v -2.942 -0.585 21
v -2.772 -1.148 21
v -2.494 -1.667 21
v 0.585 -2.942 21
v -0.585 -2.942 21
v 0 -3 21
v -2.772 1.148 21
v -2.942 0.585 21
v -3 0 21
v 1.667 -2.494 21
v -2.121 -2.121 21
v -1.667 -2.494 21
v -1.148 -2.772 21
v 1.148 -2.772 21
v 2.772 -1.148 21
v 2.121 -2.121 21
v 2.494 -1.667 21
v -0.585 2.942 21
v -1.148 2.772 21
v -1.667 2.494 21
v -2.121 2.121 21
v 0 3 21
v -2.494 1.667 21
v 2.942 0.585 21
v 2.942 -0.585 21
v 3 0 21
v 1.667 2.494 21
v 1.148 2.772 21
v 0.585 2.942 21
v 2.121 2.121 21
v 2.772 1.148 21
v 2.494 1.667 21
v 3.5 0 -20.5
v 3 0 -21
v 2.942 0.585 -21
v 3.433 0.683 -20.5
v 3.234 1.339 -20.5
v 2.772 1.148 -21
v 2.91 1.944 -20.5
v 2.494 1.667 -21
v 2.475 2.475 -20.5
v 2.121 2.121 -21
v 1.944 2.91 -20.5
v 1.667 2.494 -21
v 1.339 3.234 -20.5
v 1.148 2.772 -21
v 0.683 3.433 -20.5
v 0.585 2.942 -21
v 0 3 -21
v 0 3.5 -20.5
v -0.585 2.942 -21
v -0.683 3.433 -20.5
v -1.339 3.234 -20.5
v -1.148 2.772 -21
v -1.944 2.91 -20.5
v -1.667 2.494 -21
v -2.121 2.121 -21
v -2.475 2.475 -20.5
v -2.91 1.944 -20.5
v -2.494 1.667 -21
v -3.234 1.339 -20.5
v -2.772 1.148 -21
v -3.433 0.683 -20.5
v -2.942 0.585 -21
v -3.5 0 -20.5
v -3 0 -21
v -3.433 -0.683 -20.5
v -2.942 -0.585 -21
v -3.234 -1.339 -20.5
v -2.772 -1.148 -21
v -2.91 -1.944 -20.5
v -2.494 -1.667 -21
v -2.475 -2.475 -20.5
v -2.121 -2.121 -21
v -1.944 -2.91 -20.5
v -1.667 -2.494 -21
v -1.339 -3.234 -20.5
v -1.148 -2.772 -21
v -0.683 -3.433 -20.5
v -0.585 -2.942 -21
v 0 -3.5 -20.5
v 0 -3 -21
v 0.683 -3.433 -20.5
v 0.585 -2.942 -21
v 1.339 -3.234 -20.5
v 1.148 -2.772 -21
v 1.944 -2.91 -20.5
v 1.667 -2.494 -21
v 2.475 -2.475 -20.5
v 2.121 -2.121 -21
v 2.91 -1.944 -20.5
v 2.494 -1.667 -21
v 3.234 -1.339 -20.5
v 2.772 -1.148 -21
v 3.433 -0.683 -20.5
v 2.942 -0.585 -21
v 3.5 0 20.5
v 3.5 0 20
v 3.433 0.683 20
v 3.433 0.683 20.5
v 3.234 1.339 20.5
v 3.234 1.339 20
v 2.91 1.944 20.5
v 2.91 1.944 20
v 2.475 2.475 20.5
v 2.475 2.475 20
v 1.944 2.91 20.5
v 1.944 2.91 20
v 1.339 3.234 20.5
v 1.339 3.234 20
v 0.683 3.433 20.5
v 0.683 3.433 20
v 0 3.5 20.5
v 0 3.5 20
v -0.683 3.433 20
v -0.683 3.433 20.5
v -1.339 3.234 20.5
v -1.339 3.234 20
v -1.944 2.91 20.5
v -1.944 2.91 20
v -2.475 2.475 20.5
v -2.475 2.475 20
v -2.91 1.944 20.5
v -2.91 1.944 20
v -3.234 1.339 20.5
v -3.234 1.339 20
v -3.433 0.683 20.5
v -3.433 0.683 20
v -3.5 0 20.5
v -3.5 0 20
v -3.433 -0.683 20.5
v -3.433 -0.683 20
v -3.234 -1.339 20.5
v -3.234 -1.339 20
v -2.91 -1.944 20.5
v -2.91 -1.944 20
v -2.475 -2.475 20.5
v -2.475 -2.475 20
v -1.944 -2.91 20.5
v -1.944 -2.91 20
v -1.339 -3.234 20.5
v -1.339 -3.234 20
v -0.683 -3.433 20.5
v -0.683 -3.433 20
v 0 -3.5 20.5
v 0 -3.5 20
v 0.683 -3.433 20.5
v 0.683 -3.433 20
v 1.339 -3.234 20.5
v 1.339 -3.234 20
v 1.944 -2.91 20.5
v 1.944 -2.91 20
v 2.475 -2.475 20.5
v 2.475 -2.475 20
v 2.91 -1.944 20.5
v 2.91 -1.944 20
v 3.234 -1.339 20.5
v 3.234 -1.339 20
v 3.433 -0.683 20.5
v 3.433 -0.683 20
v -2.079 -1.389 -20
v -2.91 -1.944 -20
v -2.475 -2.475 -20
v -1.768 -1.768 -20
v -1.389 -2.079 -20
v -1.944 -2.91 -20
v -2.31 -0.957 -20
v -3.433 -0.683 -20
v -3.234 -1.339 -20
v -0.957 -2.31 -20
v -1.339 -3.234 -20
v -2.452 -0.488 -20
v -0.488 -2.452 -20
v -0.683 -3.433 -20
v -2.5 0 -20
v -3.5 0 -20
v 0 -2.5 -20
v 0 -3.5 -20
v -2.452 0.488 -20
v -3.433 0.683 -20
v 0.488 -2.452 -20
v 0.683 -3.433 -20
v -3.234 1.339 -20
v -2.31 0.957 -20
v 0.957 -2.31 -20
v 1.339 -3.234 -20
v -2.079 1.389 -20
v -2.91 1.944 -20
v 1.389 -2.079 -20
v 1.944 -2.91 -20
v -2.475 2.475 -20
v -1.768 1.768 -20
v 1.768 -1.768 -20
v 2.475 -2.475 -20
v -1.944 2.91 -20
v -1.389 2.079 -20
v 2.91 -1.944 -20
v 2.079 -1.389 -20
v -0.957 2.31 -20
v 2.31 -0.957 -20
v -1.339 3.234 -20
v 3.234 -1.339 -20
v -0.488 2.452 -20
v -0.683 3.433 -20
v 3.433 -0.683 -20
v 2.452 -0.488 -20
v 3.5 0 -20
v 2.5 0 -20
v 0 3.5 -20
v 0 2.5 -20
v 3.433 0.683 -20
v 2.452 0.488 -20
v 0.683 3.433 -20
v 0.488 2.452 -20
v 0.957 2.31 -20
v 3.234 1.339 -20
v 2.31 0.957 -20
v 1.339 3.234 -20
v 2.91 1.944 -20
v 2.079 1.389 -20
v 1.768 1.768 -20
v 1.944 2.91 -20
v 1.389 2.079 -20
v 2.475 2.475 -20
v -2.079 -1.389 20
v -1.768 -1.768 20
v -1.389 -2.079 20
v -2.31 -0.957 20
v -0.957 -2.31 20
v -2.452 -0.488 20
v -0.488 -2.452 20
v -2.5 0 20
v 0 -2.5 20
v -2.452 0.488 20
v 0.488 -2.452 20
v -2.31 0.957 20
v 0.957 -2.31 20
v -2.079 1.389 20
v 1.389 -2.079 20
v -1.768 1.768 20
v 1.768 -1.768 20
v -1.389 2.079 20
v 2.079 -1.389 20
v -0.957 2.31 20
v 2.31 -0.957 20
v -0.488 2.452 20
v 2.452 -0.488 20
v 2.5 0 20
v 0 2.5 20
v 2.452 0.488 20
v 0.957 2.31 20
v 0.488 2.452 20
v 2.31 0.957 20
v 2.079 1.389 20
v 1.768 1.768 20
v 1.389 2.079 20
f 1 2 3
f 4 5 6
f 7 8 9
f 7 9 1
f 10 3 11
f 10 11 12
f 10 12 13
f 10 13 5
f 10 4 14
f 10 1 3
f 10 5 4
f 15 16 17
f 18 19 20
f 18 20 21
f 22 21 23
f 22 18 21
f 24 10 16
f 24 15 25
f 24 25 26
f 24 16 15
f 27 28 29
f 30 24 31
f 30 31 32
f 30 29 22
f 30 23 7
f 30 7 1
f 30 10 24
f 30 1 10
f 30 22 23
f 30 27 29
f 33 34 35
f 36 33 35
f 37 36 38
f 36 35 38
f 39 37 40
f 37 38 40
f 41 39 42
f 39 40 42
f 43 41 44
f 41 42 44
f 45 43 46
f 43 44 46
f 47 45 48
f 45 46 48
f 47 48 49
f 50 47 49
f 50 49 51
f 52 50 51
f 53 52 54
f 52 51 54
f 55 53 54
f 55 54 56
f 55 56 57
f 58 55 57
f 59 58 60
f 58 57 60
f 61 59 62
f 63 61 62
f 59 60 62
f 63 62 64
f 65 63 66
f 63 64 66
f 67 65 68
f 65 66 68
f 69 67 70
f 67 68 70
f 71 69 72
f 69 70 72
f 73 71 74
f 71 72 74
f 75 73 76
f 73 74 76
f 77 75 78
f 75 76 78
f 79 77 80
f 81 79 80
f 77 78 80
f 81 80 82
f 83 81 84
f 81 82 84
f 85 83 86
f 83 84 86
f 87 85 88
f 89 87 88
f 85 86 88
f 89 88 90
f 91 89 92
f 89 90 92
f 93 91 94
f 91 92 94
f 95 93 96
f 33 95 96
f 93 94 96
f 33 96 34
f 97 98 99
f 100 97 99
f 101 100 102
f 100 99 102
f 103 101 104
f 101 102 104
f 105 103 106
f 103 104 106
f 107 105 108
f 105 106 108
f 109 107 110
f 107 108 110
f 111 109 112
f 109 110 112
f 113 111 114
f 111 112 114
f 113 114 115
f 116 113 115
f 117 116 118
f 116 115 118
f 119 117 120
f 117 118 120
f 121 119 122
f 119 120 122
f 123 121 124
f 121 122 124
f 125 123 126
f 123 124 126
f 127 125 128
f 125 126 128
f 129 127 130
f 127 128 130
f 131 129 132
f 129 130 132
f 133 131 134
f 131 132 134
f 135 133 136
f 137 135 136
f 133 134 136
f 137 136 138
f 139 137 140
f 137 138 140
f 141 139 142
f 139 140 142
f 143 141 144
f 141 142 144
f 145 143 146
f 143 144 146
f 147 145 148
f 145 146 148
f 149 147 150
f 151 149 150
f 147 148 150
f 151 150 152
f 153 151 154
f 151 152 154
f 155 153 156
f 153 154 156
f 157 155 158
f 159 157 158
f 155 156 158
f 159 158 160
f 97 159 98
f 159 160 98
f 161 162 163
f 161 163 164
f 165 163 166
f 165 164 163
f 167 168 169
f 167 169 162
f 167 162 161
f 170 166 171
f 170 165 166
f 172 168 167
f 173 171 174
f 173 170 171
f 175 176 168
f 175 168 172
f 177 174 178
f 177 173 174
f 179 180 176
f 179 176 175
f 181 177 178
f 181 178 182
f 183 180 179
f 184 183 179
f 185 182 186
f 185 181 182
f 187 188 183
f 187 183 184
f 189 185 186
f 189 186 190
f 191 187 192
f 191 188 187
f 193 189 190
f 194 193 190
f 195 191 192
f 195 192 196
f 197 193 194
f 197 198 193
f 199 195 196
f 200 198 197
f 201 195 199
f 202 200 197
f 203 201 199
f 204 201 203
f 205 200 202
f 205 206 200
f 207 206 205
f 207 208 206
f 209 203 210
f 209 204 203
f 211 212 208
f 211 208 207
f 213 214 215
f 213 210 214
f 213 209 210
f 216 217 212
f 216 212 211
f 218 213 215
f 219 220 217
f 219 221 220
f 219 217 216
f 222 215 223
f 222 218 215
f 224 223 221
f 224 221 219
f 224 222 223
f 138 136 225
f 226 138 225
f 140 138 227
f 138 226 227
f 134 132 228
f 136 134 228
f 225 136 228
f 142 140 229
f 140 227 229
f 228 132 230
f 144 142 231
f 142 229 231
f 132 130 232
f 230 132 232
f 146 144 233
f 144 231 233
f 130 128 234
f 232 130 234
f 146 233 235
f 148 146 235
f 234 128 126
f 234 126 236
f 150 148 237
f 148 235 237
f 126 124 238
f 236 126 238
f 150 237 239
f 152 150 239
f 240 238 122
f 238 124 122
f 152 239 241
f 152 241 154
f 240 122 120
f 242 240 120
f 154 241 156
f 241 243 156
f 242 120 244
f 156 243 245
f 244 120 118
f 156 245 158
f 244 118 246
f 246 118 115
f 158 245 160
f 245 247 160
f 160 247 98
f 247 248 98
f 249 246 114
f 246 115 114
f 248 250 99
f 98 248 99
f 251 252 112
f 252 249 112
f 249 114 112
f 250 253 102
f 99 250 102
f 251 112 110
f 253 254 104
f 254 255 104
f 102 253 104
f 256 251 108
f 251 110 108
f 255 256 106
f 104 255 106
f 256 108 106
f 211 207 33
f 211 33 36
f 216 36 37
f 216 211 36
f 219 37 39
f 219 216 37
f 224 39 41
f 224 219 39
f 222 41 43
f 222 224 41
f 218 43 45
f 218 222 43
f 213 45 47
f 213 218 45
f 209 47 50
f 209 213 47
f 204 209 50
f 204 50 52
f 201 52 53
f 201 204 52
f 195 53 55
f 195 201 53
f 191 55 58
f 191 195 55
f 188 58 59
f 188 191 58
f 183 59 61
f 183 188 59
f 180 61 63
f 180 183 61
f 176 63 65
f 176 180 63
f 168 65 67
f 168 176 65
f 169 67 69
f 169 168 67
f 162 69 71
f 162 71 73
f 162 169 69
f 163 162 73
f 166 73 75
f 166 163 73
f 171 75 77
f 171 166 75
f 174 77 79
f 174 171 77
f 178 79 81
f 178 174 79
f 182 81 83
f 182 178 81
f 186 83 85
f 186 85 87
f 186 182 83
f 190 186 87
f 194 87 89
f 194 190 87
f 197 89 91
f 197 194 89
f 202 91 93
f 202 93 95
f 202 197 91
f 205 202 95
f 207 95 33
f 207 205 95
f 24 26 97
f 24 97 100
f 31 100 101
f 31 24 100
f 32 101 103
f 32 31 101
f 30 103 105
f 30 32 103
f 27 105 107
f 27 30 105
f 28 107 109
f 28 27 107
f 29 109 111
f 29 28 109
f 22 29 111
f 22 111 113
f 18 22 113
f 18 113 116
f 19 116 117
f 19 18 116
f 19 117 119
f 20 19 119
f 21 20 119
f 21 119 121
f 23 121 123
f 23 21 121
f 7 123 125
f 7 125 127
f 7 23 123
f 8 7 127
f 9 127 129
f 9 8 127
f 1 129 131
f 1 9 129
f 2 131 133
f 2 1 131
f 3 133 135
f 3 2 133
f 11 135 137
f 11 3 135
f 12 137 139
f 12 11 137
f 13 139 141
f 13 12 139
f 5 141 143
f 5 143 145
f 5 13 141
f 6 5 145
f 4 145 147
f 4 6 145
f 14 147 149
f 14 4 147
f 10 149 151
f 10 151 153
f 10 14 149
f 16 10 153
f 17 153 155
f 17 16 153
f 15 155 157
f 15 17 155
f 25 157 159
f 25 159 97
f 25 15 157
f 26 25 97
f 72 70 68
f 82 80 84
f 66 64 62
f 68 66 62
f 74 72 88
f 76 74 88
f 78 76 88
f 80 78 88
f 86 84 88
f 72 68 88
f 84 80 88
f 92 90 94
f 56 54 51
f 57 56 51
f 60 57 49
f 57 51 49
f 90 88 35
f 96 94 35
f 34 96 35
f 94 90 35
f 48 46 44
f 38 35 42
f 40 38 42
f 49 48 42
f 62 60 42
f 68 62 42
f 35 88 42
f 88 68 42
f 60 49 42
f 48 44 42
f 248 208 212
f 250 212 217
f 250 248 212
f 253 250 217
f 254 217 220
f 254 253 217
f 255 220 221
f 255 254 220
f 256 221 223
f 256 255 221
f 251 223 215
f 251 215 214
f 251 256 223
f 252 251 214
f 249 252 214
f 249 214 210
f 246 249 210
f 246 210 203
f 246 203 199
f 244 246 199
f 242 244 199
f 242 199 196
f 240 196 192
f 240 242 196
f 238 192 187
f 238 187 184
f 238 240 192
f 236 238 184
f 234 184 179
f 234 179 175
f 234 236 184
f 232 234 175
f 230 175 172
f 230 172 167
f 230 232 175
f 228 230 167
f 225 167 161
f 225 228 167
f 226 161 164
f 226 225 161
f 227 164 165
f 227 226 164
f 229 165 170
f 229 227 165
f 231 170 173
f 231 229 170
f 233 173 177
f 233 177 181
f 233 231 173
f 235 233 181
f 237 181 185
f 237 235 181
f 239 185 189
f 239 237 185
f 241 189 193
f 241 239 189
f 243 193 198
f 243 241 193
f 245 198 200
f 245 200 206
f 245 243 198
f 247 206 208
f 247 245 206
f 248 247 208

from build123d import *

# Parameters (mm, degrees)
SKETCH1_R           = 2.5
BOSS_EXTRUDE1_DEPTH = 20
SKETCH2_R           = 3.5
BOSS_EXTRUDE2_DEPTH = 1
CHAMFER1_SIZE       = 0.5


with BuildPart() as part:
    # Sketch1 → Boss-Extrude1 (new body, symmetric)
    with BuildSketch(Plane.XY):
        Circle(SKETCH1_R)
    extrude(amount=BOSS_EXTRUDE1_DEPTH, both=True)

    # Sketch2 → Boss-Extrude2 (add)
    with BuildSketch(Plane.XY.offset(20)):
        Circle(SKETCH2_R)
    boss_extrude2 = extrude(amount=BOSS_EXTRUDE2_DEPTH)

    # Mirror1: Boss-Extrude2 across plane
    add(boss_extrude2.mirror(Plane.XY))

    # Chamfer1
    chamfer1_edges = [part.edges().sort_by_distance(p)[0] for p in [
        (-3.5, 0, 21),
        (-3.5, 0, -21),
    ]]
    chamfer(chamfer1_edges, length=CHAMFER1_SIZE)


solid = part.part
